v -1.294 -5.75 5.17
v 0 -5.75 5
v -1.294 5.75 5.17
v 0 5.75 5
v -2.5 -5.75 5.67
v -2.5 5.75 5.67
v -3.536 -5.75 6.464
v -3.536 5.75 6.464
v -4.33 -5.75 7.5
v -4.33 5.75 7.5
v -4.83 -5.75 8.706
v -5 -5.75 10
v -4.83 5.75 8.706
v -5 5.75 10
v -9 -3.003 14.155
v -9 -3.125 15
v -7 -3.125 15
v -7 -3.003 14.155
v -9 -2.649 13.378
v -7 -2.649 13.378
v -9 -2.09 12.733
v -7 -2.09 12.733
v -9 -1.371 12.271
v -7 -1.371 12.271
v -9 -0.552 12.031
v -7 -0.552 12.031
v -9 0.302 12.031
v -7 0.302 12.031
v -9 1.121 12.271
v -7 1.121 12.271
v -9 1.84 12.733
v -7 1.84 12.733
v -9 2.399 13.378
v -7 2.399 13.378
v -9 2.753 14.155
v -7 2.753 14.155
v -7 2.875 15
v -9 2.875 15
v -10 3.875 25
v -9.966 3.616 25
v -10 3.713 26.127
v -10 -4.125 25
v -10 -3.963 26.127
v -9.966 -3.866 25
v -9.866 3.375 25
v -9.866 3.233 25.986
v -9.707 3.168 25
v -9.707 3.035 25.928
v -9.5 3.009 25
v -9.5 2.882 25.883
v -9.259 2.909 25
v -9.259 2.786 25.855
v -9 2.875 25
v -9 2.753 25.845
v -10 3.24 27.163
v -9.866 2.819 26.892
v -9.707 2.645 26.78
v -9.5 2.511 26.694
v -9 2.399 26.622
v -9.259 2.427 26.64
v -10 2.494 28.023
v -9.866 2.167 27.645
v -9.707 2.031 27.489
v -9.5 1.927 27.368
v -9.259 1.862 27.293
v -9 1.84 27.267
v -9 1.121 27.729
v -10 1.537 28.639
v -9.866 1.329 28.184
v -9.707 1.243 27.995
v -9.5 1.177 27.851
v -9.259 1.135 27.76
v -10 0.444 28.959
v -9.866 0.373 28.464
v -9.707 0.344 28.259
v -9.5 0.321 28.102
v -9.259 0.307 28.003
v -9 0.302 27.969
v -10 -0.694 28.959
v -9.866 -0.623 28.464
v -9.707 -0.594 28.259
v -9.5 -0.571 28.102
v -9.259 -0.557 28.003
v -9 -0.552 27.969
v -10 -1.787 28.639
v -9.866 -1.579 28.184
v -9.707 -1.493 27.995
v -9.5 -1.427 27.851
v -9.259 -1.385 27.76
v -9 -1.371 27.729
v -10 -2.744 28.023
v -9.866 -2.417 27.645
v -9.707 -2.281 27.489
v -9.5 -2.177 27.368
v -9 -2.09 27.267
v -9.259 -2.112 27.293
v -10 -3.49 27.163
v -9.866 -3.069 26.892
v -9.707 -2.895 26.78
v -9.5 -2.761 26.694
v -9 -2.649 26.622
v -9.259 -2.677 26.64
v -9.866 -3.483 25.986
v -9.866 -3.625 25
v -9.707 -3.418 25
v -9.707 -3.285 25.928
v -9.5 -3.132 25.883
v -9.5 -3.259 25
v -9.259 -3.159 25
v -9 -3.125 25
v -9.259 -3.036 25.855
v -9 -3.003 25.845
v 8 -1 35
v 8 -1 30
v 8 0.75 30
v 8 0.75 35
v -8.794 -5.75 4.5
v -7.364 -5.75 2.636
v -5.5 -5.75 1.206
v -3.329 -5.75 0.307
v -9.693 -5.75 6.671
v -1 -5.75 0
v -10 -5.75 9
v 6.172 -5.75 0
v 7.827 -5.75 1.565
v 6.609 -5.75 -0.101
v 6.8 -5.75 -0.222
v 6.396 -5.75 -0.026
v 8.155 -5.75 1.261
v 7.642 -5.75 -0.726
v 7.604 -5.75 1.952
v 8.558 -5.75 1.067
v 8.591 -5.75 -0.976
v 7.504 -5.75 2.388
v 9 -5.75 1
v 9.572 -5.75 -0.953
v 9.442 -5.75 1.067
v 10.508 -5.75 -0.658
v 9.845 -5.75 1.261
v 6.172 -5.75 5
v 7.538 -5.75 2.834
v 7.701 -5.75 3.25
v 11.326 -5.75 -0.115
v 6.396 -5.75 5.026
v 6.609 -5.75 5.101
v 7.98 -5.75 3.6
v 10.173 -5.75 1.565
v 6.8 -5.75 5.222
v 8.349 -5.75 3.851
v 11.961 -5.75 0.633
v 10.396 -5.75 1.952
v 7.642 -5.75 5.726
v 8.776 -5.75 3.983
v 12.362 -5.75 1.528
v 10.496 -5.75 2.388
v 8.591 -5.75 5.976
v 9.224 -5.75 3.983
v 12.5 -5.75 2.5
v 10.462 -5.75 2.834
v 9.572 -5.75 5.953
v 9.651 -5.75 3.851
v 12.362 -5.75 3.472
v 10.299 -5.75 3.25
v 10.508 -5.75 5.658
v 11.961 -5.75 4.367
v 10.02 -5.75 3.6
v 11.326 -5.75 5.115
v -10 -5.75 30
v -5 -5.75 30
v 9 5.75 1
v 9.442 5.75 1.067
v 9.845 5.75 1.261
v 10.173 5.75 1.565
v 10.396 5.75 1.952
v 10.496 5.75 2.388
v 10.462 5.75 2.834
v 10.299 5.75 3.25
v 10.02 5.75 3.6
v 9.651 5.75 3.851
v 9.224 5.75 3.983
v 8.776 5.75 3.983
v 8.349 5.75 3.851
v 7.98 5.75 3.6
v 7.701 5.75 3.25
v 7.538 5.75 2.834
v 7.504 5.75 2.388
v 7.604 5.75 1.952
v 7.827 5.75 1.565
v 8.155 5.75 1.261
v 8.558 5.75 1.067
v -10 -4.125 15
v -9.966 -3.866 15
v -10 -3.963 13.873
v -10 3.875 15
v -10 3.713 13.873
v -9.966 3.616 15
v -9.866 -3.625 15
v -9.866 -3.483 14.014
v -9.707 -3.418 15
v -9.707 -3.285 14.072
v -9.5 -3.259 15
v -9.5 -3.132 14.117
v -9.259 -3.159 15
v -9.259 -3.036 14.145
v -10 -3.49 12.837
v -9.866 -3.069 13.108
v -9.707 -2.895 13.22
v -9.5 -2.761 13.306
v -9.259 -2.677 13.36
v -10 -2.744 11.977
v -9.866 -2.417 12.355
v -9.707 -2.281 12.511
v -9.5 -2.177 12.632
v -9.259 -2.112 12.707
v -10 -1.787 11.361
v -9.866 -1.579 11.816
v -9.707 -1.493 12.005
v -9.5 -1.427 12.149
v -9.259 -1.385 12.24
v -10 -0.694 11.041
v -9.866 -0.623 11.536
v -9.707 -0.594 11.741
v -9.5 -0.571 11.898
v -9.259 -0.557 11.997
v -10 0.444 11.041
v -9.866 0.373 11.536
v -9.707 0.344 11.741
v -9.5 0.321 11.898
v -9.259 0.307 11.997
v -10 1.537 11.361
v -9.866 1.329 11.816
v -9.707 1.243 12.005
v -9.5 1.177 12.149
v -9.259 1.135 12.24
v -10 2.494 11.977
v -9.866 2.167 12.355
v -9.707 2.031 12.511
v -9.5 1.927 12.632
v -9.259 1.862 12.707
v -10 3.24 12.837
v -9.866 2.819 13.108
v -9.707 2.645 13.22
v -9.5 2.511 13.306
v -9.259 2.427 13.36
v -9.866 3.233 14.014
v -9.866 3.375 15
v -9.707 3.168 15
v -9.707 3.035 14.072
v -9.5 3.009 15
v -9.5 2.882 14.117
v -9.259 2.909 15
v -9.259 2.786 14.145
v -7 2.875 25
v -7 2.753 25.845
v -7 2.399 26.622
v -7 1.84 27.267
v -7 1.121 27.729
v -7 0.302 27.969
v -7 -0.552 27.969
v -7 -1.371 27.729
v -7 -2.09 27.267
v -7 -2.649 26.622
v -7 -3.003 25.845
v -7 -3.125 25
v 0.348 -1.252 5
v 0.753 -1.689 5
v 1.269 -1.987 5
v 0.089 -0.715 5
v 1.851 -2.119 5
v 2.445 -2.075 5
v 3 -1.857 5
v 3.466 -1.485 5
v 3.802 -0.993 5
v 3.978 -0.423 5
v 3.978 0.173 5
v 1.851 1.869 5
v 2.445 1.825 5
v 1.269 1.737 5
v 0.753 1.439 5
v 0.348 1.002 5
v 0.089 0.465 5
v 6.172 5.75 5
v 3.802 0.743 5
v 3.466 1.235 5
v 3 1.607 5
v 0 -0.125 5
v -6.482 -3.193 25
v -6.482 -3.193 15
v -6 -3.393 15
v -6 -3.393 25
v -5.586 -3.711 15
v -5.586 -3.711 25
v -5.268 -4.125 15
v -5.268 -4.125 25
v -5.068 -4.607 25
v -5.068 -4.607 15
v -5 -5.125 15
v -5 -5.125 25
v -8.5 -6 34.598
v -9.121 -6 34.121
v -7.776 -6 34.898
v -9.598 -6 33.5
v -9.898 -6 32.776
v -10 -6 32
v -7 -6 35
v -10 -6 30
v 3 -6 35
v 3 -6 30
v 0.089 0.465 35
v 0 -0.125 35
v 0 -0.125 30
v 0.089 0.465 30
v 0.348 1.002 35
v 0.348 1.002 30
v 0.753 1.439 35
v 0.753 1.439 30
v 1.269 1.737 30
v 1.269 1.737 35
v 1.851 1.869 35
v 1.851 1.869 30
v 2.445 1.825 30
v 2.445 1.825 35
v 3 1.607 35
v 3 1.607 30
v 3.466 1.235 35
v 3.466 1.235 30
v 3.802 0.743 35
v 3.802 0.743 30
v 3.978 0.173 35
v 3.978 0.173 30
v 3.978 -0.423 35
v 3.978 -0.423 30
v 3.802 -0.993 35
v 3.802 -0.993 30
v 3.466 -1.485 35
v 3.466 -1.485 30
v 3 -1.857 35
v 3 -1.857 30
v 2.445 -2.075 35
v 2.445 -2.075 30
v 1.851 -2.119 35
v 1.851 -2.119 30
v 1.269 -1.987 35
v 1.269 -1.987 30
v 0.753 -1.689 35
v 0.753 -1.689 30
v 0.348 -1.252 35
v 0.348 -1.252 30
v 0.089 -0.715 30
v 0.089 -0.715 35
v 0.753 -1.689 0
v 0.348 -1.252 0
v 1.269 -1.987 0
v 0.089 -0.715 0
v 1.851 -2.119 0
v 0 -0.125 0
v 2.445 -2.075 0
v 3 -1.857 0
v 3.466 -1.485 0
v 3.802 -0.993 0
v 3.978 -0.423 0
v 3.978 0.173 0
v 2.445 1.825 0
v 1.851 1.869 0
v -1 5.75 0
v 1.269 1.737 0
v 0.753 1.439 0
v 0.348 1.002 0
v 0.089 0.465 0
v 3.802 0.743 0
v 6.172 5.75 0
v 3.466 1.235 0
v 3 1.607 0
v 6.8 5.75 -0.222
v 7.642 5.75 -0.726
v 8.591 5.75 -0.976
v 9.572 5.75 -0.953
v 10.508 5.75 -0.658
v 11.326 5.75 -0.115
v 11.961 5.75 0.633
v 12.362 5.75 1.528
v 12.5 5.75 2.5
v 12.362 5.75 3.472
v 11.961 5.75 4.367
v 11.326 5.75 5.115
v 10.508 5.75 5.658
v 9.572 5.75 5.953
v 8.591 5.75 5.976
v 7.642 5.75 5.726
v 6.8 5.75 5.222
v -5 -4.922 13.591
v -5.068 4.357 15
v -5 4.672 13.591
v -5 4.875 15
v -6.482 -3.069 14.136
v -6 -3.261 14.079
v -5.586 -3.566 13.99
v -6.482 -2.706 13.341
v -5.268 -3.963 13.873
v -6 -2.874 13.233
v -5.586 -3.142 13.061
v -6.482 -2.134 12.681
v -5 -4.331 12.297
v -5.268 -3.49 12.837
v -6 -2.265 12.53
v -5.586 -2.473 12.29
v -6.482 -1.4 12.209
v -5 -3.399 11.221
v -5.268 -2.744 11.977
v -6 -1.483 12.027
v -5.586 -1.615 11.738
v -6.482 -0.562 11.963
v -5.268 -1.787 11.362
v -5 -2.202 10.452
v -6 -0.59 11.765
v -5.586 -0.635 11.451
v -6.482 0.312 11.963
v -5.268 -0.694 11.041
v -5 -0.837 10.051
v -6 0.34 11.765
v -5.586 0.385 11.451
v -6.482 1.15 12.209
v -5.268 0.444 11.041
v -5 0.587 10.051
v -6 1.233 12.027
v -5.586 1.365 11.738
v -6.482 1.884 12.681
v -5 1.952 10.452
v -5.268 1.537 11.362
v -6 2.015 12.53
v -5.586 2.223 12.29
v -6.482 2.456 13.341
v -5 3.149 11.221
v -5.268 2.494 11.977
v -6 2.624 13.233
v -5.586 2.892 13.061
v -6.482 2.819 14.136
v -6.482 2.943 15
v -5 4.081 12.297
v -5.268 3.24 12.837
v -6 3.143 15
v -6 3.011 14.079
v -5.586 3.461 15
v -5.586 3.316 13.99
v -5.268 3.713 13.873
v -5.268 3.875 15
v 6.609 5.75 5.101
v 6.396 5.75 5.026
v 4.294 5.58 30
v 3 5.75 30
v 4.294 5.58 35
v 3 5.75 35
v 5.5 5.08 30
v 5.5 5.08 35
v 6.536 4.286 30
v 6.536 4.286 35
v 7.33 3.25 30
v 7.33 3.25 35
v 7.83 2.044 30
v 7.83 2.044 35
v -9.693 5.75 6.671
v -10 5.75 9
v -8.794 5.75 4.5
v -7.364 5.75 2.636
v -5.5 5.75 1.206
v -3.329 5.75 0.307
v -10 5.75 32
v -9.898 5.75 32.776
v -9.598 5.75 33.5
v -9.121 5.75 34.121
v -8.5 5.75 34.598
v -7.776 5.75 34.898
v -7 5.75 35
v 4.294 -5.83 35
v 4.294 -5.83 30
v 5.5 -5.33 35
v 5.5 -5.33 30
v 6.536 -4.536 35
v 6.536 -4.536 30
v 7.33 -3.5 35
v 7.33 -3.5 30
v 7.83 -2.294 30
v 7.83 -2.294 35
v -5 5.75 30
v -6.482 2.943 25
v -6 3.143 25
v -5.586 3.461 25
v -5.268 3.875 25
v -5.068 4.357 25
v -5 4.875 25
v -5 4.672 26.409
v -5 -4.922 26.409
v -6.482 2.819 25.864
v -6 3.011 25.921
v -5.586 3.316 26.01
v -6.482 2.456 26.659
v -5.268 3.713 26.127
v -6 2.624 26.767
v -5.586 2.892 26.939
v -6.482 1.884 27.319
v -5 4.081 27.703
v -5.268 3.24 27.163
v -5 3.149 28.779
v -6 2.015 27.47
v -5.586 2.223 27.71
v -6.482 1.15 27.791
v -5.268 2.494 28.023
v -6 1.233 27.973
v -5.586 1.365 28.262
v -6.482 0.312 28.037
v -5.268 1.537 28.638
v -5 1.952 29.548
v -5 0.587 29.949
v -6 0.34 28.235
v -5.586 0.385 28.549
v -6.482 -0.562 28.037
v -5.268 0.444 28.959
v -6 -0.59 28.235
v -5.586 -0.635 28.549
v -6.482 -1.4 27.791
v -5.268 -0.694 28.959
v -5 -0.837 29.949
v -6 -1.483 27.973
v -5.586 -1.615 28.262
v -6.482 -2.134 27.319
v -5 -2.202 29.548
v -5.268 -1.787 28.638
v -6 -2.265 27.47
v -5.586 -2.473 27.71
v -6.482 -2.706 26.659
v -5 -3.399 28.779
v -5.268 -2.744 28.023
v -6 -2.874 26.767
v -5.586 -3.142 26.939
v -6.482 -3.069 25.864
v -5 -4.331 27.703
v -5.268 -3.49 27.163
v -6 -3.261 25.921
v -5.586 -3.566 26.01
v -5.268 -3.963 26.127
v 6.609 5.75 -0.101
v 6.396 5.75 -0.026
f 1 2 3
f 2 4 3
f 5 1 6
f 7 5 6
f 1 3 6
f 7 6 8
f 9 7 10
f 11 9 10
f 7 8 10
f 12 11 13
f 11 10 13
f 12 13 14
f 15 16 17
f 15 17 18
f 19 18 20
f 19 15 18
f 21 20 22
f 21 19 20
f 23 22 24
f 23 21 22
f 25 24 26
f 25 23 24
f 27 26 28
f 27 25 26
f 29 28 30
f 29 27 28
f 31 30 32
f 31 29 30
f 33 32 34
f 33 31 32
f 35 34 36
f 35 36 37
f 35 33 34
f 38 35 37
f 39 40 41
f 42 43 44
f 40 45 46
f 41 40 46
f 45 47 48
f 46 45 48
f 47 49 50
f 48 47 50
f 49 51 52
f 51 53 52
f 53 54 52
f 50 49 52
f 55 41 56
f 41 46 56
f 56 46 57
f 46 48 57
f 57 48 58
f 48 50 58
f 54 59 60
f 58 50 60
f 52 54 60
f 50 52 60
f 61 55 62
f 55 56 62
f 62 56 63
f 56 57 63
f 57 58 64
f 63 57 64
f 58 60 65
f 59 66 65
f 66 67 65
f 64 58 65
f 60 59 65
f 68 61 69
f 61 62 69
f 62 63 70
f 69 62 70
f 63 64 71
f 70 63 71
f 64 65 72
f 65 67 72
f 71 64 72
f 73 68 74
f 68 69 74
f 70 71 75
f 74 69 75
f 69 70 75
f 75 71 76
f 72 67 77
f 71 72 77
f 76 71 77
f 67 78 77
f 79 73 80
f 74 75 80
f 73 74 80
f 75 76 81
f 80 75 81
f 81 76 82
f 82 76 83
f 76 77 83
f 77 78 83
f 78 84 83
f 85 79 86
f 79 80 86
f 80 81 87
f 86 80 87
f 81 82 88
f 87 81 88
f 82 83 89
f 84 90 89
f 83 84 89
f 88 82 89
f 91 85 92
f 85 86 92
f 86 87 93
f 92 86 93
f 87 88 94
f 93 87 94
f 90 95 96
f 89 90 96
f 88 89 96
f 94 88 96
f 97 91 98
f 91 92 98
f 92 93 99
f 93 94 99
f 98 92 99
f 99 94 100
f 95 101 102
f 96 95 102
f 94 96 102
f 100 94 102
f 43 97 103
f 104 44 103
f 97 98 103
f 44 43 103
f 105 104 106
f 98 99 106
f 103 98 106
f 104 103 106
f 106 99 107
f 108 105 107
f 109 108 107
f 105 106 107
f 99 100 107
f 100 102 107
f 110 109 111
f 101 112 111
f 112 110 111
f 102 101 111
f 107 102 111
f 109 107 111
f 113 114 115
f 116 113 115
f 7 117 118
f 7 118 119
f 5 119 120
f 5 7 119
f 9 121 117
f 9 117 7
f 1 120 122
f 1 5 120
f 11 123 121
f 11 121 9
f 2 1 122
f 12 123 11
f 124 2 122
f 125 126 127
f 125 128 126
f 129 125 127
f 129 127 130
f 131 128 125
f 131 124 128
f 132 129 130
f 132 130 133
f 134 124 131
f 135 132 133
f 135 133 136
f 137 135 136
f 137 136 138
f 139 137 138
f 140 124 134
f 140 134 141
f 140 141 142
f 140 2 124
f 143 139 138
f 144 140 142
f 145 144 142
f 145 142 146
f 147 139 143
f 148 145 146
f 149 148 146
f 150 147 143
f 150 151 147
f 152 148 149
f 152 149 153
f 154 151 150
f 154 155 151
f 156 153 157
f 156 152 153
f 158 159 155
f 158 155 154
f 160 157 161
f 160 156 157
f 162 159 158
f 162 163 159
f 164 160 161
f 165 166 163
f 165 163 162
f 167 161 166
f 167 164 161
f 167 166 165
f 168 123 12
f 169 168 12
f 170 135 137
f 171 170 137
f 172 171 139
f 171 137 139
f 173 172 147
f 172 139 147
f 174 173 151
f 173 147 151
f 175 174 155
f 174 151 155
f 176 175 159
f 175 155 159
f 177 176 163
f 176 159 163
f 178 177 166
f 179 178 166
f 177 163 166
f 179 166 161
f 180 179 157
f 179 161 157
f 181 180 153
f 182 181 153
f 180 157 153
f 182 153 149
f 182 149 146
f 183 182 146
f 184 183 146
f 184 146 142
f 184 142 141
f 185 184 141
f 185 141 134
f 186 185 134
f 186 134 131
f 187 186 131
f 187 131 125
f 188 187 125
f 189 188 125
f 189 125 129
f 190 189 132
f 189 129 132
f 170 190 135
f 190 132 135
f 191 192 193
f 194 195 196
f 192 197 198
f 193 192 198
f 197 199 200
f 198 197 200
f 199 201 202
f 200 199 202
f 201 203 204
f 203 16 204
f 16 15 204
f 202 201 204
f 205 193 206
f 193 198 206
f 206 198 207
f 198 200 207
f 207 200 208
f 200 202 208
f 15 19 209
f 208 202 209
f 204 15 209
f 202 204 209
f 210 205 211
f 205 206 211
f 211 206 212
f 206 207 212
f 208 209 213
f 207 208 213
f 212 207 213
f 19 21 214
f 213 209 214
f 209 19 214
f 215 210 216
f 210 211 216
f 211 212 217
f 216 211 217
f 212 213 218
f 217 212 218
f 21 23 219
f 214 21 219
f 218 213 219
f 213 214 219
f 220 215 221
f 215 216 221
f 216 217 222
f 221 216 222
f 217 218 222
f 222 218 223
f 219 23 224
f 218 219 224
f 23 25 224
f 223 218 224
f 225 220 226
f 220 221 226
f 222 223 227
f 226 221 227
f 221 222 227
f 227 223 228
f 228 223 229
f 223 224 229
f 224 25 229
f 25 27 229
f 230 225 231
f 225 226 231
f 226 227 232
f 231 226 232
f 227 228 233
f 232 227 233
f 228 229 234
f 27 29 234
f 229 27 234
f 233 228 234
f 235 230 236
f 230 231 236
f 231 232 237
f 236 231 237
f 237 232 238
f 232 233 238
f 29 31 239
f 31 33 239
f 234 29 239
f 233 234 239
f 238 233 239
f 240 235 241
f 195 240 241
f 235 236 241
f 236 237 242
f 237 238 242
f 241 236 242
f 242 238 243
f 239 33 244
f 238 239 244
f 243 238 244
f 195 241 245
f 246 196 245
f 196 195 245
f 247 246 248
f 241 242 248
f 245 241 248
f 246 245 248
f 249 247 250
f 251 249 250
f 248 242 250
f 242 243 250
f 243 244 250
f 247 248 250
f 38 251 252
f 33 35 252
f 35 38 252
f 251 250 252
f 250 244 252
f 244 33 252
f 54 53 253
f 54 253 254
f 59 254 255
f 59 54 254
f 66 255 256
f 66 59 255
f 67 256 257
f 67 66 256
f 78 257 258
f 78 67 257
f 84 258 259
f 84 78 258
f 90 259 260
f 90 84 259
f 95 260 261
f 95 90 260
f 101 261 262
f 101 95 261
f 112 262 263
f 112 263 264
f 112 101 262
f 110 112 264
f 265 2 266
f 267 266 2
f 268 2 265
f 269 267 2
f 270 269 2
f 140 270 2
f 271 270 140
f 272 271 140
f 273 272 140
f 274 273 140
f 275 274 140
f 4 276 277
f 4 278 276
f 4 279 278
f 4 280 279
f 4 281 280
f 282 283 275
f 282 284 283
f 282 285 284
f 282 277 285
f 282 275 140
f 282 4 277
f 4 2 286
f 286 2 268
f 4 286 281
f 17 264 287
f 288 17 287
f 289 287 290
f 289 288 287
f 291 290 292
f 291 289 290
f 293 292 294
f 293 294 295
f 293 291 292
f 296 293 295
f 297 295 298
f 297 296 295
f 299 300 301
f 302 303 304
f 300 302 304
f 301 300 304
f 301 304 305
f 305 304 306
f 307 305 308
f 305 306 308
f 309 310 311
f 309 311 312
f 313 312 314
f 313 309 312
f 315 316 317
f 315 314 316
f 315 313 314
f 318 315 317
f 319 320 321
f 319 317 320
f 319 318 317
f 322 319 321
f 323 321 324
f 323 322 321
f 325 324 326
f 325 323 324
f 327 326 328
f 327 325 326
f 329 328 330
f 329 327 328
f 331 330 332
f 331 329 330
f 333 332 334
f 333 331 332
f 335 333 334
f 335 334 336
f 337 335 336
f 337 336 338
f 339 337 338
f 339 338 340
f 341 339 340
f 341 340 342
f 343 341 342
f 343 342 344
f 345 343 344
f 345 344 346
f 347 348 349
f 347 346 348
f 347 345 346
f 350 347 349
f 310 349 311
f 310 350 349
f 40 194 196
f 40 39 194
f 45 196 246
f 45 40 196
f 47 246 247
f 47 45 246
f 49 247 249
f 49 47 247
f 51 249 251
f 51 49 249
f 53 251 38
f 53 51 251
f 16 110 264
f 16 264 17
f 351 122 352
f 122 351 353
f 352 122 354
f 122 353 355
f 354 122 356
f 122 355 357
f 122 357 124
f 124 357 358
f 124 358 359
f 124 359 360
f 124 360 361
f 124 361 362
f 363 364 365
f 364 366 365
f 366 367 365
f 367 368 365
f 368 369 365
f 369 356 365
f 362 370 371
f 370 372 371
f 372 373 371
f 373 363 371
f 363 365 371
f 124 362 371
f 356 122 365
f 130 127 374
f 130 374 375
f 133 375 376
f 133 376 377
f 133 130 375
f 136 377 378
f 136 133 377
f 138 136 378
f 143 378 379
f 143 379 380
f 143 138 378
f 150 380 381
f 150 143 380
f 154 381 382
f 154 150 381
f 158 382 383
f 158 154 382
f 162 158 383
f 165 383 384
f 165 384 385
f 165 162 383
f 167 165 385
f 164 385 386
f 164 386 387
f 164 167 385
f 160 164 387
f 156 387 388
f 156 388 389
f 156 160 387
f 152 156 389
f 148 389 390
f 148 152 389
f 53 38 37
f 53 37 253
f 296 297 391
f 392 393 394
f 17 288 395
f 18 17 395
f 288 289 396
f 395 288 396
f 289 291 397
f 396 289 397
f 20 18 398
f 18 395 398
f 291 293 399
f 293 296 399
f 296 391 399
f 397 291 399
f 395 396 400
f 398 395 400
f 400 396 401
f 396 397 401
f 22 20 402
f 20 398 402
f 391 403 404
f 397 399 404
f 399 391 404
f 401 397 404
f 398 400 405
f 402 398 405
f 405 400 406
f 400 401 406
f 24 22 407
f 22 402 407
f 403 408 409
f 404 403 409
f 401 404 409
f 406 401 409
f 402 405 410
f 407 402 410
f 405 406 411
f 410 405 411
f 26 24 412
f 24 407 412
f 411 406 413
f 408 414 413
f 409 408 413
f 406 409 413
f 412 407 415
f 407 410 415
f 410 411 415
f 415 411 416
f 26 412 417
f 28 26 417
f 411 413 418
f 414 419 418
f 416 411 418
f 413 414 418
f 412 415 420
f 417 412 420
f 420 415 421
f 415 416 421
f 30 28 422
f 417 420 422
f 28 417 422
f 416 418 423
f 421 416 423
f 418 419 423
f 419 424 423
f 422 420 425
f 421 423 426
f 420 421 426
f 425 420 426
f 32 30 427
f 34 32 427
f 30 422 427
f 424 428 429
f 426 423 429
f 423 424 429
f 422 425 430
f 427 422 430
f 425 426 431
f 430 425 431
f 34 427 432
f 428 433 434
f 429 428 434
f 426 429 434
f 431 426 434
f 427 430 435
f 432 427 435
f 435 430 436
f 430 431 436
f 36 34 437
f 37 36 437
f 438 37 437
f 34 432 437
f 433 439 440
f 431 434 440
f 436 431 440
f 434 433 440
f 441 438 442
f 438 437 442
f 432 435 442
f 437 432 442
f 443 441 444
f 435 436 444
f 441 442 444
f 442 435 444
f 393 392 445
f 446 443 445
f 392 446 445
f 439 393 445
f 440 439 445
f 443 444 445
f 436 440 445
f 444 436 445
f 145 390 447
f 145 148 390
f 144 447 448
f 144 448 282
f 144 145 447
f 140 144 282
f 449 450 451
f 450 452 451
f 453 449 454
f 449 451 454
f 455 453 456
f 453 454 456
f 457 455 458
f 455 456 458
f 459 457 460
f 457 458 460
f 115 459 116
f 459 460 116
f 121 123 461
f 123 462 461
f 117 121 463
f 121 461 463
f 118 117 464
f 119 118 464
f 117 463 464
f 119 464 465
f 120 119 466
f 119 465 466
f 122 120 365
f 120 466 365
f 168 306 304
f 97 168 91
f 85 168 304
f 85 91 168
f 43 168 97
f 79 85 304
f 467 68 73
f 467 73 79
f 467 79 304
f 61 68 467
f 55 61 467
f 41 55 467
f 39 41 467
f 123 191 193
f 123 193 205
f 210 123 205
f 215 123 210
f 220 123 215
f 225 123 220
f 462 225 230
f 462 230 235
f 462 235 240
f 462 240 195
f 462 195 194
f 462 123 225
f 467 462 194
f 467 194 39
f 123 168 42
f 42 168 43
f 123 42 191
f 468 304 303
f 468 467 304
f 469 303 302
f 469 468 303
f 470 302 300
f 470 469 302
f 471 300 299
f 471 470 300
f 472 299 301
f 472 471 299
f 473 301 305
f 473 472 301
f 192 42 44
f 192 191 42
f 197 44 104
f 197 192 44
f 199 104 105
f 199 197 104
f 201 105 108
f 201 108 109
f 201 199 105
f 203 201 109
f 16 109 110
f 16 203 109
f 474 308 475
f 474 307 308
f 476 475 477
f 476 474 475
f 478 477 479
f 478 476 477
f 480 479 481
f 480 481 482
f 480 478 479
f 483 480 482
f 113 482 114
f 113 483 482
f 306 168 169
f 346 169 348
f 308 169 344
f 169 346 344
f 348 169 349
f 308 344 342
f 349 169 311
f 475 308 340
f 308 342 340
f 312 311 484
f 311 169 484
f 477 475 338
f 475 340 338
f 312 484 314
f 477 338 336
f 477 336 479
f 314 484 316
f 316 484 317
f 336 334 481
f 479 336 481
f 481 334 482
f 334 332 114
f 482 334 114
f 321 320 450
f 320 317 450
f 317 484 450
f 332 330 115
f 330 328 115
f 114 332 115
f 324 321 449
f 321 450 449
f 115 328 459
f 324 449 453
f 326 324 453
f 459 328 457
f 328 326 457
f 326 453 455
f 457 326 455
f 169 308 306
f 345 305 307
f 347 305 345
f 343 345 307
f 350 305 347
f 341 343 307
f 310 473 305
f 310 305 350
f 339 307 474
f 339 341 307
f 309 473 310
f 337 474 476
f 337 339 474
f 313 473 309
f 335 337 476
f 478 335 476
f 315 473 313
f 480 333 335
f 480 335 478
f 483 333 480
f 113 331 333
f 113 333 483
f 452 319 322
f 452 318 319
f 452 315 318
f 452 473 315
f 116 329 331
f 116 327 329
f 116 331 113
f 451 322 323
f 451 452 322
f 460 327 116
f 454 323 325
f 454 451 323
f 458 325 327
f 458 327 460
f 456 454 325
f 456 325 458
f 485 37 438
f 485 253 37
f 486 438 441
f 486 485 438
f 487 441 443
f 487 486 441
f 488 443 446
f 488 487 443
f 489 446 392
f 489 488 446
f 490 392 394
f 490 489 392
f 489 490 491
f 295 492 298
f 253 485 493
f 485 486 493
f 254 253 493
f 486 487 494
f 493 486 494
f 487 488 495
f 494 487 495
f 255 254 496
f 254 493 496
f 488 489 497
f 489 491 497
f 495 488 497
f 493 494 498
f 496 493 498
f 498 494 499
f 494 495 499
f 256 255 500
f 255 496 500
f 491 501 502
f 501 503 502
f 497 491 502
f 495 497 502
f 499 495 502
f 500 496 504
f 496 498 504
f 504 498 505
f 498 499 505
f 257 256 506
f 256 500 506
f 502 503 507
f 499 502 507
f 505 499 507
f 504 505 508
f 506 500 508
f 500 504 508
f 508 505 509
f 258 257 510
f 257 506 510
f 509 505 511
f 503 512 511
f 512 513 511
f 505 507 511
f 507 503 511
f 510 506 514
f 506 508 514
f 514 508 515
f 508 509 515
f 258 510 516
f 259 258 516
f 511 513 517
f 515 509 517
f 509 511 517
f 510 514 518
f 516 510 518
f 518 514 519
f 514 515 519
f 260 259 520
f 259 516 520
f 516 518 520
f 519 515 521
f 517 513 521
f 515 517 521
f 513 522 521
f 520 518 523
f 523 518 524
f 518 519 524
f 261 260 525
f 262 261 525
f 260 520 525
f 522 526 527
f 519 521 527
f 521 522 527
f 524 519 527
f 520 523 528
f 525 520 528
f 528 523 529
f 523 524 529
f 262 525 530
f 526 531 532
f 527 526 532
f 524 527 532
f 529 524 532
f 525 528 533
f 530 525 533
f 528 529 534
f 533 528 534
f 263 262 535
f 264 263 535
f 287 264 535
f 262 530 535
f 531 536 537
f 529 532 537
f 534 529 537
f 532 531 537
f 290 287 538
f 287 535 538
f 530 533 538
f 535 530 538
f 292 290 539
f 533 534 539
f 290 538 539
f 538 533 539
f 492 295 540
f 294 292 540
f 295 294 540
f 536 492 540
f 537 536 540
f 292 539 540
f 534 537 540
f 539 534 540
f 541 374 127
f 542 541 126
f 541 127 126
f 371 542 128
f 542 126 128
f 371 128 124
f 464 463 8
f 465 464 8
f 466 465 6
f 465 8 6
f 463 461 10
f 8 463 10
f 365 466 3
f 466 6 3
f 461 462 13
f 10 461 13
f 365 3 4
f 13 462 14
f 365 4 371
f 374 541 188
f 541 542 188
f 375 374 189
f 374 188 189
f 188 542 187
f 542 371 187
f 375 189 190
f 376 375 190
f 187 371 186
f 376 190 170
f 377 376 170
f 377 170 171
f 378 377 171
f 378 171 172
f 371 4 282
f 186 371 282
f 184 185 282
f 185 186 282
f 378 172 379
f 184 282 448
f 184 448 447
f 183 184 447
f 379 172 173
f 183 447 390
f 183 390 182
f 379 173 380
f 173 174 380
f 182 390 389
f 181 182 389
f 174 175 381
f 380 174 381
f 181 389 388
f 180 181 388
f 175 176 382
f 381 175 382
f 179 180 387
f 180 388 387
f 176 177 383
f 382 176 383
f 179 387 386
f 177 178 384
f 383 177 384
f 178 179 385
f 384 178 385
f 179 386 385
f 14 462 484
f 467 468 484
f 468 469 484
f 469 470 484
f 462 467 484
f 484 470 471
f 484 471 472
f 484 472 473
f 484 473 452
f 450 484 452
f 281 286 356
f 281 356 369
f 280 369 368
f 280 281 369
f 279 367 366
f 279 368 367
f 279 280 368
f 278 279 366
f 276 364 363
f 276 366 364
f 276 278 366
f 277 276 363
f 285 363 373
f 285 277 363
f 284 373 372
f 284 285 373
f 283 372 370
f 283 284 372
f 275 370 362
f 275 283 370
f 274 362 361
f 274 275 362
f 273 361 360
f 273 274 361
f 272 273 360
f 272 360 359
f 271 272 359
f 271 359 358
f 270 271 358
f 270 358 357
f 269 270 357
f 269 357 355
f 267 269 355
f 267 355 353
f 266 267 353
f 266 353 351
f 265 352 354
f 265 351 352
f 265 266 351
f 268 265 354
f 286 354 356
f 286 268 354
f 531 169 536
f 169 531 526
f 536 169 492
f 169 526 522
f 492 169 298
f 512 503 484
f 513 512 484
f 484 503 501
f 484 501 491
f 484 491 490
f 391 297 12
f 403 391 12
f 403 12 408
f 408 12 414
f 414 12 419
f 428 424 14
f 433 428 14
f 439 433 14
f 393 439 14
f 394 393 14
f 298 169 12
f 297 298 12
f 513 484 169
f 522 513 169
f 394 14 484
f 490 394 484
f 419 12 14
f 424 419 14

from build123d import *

# Parameters (mm, degrees)
SKETCH1_W               = 20
SKETCH1_H               = 11.5
BOSS_EXTRUDE1_DEPTH     = 5
SKETCH2_W               = 5
SKETCH2_H               = 11.5
BOSS_EXTRUDE2_DEPTH     = 25
SKETCH3_W               = 18
SKETCH3_H               = 11.75
BOSS_EXTRUDE3_DEPTH     = 5
CUT_EXTRUDE1_DEPTH      = 5
CUT_EXTRUDE2_DEPTH      = 33.186953879
CUT_EXTRUDE2_DEPTH_BACK = 33.186953879
SKETCH5_R               = 2
FILLET1_R               = 9
FILLET7_R               = 5
FILLET8_R               = 1
FILLET9_R               = 2
CUT_EXTRUDE4_DEPTH      = 39.173943993
CUT_EXTRUDE4_DEPTH_BACK = 39.173943993
SKETCH10_R              = 1.5
SKETCH10_4_R            = 3.5
SKETCH10_4_R_2          = 1.5
BOSS_EXTRUDE7_DEPTH     = 11.5
FILLET13_R              = 1
FILLET16_R              = 5
FILLET17_R              = 3


with BuildPart() as part:
    # Sketch1 → Boss-Extrude1 (new body)
    with BuildSketch(Plane.XY):
        Rectangle(SKETCH1_W, SKETCH1_H)
    extrude(amount=BOSS_EXTRUDE1_DEPTH)

    # Sketch2 → Boss-Extrude2 (add)
    with BuildSketch(Plane.XY.offset(5)):
        with Locations((-7.5, 0)):
            Rectangle(SKETCH2_W, SKETCH2_H)
    extrude(amount=BOSS_EXTRUDE2_DEPTH)

    # Sketch3 → Boss-Extrude3 (add)
    with BuildSketch(Plane.XY.offset(30)):
        with Locations((-1, -0.125)):
            Rectangle(SKETCH3_W, SKETCH3_H)
    extrude(amount=BOSS_EXTRUDE3_DEPTH)

    # Sketch4 → Cut-Extrude1 (cut)
    with BuildSketch(Plane.ZY.offset(10)):
        with BuildLine():
            Line((15, 2.875), (25, 2.875))
            ThreePointArc((25, 2.875), (28, -0.125), (25, -3.125))
            Line((25, -3.125), (15, -3.125))
            ThreePointArc((15, -3.125), (12, -0.125), (15, 2.875))
        make_face()
    extrude(amount=-CUT_EXTRUDE1_DEPTH, mode=Mode.SUBTRACT)

    # Sketch5 → Cut-Extrude2 (cut, two sides: drawn at the far end of the back side and taken through both)
    with BuildSketch(Plane(origin=(0, 0, 30), x_dir=(-1, 0, 0), z_dir=(0, 0, -1)).offset(-CUT_EXTRUDE2_DEPTH_BACK)):
        with Locations((-2, -0.125)):
            Circle(SKETCH5_R)
    extrude(amount=CUT_EXTRUDE2_DEPTH + CUT_EXTRUDE2_DEPTH_BACK, mode=Mode.SUBTRACT)

    # Fillet1
    fillet1_edges = [part.edges().sort_by_distance(p)[0] for p in [
        (-10, 0, 0),
    ]]
    fillet(fillet1_edges, radius=FILLET1_R)

    # Fillet7
    fillet7_edges = [part.edges().sort_by_distance(p)[0] for p in [
        (8, -6, 32.5),
        (8, 5.75, 32.5),
    ]]
    fillet(fillet7_edges, radius=FILLET7_R)

    # Fillet8
    fillet8_edges = [part.edges().sort_by_distance(p)[0] for p in [
        (-10, -0.125, 12),
        (-10, -3.125, 20),
        (-10, -0.125, 28),
        (-10, 2.875, 20),
    ]]
    fillet(fillet8_edges, radius=FILLET8_R)

    # Fillet9
    fillet9_edges = [part.edges().sort_by_distance(p)[0] for p in [
        (-5, -0.125, 12),
        (-5, 2.875, 20),
        (-5, -0.125, 28),
        (-5, -3.125, 20),
    ]]
    fillet(fillet9_edges, radius=FILLET9_R - 0.0001)  # a hair under: the kernel refuses the full size

    # Sketch10 → Cut-Extrude4 (cut, two sides: drawn at the far end of the back side and taken through both)
    with BuildSketch(Plane.XZ.offset(5.75).offset(-CUT_EXTRUDE4_DEPTH_BACK)):
        with Locations((9, 2.5)):
            Circle(SKETCH10_R)
    extrude(amount=CUT_EXTRUDE4_DEPTH + CUT_EXTRUDE4_DEPTH_BACK, mode=Mode.SUBTRACT)

    # Sketch10<4> → Boss-Extrude7 (add)
    with BuildSketch(Plane.XZ.offset(5.75)):
        with Locations((9, 2.5)):
            Circle(SKETCH10_4_R)
        with Locations(Location((9, 2.5, 0), (0, 0, 270))):
            Circle(SKETCH10_4_R_2, mode=Mode.SUBTRACT)
    extrude(amount=-BOSS_EXTRUDE7_DEPTH)

    # Fillet13
    fillet13_edges = [part.edges().sort_by_distance(p)[0] for p in [
        (6.550510257, 0, 0),
        (6.550510257, 0, 5),
    ]]
    fillet(fillet13_edges, radius=FILLET13_R)

    # Fillet16
    fillet16_edges = [part.edges().sort_by_distance(p)[0] for p in [
        (-5, 0, 5),
    ]]
    fillet(fillet16_edges, radius=FILLET16_R - 0.0001)  # a hair under: the kernel refuses the full size

    # Fillet17
    fillet17_edges = [part.edges().sort_by_distance(p)[0] for p in [
        (-10, -0.125, 35),
    ]]
    fillet(fillet17_edges, radius=FILLET17_R)


solid = part.part
